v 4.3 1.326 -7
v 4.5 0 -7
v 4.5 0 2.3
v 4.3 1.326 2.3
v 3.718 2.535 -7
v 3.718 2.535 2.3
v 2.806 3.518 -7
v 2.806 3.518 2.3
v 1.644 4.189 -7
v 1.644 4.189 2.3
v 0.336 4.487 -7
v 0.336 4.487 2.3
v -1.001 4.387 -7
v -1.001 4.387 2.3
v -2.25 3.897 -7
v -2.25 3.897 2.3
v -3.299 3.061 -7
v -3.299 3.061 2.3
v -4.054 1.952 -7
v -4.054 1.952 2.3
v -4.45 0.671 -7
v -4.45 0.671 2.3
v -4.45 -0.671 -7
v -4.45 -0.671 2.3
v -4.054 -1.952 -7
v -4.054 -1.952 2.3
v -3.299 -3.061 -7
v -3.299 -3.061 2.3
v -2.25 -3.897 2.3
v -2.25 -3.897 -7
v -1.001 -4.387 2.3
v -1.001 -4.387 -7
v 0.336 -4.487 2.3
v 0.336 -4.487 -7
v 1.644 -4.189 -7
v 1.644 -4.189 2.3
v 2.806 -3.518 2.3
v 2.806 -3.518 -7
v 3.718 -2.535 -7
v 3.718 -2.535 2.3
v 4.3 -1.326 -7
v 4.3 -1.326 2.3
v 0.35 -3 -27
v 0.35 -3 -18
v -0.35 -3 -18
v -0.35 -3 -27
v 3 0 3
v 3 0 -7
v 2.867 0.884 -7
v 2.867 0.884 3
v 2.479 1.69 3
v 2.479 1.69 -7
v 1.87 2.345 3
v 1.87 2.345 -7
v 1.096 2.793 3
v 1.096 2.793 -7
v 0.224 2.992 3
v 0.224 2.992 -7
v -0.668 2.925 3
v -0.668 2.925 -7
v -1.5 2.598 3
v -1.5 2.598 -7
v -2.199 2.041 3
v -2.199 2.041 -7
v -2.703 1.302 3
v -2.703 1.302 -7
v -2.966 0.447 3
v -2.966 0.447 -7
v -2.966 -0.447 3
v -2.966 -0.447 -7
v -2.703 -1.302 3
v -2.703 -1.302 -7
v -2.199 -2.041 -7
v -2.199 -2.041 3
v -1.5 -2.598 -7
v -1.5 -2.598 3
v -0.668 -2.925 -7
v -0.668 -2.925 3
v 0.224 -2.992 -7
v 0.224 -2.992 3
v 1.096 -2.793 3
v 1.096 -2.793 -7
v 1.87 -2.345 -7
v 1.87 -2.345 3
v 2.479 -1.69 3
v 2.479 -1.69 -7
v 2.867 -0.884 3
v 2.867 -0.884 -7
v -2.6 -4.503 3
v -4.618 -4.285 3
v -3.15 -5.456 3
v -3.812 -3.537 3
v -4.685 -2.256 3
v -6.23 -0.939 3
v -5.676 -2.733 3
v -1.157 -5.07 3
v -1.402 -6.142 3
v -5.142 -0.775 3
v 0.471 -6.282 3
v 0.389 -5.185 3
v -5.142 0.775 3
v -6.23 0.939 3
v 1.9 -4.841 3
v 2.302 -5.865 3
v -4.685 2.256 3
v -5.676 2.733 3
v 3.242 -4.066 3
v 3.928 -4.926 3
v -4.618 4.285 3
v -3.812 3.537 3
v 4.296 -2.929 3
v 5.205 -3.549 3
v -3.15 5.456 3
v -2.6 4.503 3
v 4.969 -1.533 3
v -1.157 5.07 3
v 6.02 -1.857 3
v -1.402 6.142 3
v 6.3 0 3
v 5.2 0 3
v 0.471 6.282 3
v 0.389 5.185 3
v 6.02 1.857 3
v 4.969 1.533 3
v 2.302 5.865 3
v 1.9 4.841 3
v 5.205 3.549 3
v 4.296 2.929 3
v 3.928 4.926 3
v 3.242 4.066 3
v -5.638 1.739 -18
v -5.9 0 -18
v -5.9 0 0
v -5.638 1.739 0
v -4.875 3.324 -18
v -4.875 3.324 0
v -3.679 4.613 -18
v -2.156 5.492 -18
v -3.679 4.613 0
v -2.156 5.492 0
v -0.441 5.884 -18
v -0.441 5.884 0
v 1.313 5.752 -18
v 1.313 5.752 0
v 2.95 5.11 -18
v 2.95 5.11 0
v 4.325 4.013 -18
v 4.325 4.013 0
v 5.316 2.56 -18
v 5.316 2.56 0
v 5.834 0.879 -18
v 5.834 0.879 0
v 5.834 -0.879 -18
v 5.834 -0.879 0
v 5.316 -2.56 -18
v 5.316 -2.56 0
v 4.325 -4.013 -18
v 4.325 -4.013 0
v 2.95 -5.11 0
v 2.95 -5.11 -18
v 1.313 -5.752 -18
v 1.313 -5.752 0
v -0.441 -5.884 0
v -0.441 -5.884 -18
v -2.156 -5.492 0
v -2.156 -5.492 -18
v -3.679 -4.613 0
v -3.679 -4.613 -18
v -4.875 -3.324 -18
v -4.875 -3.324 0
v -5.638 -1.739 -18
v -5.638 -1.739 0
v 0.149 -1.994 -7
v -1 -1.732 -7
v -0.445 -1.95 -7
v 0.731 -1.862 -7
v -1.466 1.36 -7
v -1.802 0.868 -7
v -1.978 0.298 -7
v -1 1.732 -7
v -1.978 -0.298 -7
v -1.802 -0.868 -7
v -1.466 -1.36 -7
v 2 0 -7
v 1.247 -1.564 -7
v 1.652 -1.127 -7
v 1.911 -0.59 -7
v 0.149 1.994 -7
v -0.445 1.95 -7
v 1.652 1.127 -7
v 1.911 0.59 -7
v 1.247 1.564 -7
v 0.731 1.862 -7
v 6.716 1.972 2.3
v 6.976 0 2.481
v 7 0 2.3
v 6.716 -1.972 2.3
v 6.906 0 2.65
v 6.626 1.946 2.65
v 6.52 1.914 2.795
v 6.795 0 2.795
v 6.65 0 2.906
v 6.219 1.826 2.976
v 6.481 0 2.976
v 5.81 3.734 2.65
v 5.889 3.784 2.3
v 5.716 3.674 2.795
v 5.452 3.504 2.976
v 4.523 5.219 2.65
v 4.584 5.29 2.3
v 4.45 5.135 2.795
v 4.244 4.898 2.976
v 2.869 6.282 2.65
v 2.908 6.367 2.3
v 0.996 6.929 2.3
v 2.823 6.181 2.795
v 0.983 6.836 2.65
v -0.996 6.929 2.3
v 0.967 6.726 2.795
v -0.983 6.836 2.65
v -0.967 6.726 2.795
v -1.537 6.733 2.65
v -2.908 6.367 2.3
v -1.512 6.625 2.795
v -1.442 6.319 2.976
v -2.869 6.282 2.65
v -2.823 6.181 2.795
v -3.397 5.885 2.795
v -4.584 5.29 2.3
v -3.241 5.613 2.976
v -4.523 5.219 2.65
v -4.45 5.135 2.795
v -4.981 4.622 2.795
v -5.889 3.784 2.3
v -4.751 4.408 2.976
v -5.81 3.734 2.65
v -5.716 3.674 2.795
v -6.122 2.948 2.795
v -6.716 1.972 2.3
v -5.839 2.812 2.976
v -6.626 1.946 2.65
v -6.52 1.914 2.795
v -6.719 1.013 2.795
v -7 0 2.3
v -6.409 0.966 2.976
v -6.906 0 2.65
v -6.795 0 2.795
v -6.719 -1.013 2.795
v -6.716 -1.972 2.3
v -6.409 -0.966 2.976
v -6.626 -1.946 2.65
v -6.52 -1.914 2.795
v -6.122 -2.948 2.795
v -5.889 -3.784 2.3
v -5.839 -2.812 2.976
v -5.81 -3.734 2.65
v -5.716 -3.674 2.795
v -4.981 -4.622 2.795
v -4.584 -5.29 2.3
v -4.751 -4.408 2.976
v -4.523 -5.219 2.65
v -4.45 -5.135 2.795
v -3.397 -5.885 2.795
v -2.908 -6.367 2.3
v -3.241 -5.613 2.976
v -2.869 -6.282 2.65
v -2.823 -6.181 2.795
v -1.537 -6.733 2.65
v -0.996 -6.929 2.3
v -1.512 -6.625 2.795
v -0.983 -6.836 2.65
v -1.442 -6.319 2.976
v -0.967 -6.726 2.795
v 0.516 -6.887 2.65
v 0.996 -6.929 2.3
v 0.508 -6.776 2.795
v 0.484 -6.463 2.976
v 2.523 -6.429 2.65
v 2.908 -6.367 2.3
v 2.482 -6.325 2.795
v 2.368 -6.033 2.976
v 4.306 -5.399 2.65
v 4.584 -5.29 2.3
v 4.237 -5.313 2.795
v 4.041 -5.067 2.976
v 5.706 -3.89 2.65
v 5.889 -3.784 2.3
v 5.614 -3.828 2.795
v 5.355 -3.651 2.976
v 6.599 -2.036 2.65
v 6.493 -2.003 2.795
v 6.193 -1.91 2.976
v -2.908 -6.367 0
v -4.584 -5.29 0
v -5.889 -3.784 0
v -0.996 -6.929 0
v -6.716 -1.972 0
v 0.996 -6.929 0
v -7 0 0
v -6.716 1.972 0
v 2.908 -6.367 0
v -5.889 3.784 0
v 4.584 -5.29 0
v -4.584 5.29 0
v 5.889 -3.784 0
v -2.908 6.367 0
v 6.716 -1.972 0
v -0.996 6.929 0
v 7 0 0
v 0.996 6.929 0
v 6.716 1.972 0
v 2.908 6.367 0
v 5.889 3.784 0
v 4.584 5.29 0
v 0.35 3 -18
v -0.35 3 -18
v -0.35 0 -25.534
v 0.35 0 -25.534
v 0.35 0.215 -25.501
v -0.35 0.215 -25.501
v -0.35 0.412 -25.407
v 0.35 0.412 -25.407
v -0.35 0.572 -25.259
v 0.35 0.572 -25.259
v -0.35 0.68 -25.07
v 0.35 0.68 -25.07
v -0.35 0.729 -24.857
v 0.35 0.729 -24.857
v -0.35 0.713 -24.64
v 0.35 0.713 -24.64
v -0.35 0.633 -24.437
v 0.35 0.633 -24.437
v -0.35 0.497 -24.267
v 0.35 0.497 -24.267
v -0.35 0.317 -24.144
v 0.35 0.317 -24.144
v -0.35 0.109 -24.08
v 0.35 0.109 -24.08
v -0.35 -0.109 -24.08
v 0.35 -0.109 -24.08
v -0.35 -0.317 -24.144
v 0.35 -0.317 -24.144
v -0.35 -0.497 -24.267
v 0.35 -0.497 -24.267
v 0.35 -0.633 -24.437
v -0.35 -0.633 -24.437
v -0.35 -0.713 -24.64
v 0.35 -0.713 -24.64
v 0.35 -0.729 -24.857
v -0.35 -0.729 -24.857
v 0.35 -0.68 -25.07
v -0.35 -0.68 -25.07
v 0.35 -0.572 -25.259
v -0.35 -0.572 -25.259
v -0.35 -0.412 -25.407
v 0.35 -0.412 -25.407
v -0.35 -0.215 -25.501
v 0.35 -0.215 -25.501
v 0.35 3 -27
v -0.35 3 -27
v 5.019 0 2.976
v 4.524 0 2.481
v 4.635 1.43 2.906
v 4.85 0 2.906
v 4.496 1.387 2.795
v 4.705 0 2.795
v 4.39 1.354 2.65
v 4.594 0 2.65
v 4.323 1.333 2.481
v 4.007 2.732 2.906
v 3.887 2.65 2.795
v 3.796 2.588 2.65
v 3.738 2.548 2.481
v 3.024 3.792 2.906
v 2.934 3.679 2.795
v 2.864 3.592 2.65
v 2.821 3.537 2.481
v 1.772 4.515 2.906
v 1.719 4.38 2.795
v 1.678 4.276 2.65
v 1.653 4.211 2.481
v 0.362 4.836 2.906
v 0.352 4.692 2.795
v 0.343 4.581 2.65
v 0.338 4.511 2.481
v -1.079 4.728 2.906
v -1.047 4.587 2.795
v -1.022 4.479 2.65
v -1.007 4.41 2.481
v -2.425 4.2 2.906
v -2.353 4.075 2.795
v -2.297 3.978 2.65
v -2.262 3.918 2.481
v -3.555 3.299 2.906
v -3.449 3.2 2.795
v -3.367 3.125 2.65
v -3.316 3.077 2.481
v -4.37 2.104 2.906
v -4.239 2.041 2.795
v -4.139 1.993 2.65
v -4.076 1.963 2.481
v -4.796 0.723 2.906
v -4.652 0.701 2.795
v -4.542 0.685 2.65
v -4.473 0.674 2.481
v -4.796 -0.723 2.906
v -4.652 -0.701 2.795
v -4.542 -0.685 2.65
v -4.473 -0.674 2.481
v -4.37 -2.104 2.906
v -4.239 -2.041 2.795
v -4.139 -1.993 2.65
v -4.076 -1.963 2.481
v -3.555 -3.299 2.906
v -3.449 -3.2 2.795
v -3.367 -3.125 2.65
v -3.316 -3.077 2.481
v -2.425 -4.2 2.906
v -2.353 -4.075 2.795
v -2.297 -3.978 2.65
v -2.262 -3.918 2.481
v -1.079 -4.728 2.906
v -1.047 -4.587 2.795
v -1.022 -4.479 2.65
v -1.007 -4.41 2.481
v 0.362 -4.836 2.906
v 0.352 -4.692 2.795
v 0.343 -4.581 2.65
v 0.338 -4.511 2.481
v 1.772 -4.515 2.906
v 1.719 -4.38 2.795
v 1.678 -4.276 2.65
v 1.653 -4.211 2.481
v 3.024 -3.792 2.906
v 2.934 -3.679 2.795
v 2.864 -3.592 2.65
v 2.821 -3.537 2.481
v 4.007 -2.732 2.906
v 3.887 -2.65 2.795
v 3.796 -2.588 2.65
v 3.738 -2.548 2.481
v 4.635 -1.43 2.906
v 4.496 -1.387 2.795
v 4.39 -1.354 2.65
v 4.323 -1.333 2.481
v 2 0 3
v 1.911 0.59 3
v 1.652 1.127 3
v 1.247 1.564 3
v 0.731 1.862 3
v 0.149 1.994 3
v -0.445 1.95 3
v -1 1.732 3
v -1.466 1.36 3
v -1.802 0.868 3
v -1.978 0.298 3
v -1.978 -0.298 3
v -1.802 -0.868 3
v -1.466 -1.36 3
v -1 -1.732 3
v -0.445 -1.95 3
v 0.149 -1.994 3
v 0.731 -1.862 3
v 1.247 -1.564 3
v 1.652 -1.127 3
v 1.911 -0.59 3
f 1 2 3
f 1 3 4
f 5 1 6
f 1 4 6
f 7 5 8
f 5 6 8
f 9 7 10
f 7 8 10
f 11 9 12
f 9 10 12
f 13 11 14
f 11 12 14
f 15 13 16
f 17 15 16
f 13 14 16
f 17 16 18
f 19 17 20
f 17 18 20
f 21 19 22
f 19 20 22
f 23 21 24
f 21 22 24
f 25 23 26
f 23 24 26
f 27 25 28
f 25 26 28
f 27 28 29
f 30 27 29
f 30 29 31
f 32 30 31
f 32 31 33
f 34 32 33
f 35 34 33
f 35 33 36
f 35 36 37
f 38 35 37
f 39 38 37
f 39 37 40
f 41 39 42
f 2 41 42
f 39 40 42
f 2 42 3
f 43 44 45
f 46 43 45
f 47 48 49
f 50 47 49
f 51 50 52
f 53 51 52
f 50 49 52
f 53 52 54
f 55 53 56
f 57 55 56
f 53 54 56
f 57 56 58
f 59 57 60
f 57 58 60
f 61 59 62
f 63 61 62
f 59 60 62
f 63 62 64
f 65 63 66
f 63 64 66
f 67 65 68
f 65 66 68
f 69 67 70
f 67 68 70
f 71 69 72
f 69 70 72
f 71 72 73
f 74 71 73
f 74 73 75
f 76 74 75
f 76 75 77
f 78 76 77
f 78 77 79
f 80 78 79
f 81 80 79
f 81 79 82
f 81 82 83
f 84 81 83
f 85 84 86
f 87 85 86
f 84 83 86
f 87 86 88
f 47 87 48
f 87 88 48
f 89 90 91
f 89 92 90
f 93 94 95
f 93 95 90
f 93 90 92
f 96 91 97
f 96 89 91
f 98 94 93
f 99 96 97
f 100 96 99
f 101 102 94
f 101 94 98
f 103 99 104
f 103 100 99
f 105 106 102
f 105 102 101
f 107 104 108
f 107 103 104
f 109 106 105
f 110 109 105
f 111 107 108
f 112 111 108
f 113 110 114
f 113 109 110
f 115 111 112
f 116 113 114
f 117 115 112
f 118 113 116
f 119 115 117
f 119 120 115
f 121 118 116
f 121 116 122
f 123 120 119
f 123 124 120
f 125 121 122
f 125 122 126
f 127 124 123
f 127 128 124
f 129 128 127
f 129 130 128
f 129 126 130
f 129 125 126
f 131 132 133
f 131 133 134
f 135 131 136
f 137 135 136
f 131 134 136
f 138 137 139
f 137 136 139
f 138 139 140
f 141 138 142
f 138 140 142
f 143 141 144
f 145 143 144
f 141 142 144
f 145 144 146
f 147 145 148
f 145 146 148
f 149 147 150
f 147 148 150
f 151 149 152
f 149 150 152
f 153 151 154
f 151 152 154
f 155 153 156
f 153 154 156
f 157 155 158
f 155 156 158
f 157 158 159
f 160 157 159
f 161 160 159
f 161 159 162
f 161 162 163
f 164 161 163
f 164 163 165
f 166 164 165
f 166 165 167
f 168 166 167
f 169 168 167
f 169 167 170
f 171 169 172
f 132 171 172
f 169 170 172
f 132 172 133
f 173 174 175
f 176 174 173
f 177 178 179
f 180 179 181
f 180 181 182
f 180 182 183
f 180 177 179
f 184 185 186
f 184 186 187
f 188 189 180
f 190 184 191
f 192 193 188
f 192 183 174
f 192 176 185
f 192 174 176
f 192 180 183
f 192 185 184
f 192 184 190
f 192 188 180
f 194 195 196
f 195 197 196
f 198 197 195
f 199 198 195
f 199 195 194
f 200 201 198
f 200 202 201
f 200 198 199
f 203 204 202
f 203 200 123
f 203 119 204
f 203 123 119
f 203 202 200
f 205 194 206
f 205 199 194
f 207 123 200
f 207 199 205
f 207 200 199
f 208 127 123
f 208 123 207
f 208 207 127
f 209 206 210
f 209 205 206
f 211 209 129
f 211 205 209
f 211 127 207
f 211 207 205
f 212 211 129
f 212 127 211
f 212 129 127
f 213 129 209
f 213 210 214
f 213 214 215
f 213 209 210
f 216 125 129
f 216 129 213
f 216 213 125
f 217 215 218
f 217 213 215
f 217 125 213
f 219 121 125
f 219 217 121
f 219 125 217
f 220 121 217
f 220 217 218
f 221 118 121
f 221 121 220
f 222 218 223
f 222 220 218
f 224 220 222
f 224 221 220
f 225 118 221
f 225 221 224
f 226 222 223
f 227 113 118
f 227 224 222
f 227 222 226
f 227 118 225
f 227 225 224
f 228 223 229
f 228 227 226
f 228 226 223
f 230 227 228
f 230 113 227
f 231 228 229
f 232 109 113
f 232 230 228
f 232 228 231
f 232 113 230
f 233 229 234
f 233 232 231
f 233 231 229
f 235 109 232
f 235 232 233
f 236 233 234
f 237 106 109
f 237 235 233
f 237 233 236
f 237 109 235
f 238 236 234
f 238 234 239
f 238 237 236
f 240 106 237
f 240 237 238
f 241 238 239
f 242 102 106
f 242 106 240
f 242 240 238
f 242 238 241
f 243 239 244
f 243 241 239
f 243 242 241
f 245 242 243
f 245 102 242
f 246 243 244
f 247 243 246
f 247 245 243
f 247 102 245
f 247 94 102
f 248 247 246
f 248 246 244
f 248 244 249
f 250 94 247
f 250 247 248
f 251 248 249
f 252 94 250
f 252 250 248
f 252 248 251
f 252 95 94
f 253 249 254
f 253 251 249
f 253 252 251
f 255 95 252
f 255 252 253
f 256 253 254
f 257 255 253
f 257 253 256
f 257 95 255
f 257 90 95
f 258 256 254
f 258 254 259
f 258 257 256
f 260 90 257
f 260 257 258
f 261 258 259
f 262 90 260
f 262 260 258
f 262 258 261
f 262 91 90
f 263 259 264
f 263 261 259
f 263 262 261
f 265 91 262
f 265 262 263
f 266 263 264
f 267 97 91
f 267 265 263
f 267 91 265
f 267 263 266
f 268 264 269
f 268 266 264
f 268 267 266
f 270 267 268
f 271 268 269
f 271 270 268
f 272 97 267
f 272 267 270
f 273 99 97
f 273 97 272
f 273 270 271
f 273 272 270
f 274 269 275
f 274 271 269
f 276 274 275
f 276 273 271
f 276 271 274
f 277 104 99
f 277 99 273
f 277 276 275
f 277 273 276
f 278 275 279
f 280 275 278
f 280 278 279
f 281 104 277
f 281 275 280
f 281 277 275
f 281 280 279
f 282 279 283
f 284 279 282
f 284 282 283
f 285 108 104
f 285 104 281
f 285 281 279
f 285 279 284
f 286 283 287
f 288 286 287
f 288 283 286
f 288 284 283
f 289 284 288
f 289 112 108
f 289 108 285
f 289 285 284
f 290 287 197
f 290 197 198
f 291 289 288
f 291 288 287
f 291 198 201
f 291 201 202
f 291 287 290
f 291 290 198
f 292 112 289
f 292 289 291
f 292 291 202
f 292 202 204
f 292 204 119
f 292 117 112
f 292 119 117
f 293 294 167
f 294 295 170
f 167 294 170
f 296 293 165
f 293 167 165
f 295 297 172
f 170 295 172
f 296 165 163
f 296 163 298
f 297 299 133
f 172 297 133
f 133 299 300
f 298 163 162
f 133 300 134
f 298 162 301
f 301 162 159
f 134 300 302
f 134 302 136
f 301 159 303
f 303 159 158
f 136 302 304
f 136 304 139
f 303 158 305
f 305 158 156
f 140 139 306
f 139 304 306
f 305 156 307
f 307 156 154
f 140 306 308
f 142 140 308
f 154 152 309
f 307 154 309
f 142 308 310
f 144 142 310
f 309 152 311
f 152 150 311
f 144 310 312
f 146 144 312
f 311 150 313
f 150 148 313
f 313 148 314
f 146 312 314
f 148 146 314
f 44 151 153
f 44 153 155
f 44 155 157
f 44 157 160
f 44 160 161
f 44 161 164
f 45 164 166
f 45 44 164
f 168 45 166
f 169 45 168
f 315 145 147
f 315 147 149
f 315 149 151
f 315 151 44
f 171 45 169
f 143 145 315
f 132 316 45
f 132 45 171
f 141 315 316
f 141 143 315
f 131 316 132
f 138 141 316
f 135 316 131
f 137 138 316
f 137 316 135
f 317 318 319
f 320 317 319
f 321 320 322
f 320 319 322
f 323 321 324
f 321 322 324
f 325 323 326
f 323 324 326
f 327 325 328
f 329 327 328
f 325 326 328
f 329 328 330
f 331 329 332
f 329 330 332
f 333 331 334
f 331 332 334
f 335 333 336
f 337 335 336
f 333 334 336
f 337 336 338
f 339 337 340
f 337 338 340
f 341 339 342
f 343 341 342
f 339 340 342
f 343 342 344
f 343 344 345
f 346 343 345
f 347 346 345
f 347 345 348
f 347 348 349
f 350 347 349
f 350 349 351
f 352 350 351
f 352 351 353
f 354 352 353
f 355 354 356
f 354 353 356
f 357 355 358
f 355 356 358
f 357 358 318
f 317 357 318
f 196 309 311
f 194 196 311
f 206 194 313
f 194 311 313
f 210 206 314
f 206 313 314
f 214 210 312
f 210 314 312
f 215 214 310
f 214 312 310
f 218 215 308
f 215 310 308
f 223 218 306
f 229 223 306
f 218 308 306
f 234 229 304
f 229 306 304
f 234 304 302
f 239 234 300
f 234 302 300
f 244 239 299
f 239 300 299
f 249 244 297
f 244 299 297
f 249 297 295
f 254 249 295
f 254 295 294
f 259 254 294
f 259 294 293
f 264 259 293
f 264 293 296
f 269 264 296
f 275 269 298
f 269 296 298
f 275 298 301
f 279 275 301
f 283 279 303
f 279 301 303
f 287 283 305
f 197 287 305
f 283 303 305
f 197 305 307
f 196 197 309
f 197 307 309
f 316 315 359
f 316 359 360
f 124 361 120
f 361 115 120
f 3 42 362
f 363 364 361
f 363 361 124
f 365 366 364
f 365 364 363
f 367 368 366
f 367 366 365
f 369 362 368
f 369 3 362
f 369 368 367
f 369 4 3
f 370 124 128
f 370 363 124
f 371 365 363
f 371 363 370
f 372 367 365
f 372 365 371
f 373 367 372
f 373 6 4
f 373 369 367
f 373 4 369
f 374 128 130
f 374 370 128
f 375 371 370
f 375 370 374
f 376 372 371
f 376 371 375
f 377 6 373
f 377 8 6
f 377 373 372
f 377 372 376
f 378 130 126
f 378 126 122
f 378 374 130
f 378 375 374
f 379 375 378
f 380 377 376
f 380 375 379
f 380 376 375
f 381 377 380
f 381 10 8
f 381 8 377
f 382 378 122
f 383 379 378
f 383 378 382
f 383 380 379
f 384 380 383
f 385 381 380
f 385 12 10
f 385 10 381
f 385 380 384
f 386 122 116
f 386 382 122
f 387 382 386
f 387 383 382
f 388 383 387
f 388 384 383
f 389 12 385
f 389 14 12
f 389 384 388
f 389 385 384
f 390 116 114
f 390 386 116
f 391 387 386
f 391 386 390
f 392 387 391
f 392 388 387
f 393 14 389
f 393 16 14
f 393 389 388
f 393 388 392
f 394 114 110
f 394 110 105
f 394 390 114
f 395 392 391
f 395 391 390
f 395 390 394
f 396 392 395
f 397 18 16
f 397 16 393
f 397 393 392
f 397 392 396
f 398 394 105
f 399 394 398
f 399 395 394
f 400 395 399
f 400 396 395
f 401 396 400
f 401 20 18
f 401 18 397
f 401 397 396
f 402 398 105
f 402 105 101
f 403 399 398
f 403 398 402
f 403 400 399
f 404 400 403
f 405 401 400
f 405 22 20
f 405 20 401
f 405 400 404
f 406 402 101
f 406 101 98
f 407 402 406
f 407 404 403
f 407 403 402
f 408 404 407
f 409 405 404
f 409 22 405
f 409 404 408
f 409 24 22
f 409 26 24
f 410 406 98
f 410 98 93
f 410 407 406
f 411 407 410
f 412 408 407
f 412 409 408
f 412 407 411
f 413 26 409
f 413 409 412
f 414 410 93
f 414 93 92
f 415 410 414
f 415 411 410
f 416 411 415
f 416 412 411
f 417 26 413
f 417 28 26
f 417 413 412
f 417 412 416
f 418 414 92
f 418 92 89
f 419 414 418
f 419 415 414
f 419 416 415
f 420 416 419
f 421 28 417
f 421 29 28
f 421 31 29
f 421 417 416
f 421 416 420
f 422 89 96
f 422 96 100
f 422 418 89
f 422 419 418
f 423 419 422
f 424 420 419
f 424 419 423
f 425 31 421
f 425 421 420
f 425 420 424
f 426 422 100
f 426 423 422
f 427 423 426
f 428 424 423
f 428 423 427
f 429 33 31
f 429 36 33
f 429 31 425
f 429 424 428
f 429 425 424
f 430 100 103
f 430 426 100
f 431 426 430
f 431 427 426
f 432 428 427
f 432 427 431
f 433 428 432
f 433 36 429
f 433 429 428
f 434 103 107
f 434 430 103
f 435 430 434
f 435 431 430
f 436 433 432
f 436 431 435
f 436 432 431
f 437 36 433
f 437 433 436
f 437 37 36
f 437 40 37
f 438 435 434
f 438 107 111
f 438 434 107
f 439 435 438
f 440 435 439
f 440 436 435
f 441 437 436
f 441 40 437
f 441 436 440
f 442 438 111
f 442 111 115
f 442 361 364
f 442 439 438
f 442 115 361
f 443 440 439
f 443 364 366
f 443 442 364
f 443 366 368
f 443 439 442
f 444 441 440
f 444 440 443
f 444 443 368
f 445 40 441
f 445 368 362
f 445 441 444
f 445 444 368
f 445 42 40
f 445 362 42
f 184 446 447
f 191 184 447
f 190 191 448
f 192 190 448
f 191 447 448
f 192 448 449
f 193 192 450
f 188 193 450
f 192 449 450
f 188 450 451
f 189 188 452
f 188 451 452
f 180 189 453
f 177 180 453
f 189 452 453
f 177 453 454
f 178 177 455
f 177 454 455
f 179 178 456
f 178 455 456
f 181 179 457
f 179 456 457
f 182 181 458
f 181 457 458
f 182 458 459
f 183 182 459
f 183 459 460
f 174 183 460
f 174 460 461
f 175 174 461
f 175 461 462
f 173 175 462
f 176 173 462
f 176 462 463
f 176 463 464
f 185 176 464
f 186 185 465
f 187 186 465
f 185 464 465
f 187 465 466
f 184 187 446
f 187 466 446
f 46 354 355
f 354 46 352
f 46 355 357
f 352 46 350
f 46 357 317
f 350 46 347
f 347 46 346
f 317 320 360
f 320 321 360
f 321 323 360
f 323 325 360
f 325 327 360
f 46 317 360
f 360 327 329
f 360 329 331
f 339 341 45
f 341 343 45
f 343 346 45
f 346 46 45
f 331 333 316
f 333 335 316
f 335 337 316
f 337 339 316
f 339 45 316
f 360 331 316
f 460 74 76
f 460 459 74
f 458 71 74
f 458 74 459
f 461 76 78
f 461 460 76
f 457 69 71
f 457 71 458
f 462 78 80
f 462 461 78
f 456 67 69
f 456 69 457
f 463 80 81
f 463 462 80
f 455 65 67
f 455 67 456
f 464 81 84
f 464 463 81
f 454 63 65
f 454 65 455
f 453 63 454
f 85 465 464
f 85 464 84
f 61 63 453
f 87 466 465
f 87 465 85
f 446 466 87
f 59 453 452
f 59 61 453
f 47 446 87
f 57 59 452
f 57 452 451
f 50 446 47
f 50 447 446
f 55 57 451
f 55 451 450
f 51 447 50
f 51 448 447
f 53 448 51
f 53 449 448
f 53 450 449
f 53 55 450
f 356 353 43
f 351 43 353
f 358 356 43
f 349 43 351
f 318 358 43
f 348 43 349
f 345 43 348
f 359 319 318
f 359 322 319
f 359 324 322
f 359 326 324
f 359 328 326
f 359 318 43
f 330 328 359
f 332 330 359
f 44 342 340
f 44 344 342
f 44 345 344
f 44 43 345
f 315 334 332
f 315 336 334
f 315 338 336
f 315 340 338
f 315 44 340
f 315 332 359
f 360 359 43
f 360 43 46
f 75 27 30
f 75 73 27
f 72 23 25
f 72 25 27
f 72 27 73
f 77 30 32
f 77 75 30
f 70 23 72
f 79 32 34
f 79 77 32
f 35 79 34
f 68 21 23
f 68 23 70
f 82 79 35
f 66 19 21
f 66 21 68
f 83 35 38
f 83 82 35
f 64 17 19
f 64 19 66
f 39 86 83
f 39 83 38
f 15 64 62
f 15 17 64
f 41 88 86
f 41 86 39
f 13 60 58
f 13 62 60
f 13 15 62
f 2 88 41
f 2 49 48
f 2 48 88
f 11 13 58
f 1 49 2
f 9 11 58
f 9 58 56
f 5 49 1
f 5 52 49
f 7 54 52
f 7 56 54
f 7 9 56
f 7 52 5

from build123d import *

# Parameters (mm, degrees)
SKETCH1_R           = 7
BOSS_EXTRUDE1_DEPTH = 3
SKETCH2_R           = 5.9
BOSS_EXTRUDE2_DEPTH = 18
SKETCH3_W           = 0.7
SKETCH3_H           = 6
BOSS_EXTRUDE3_DEPTH = 9
SKETCH4_R           = 0.730989372
CUT_EXTRUDE1_DEPTH  = 0.7
SKETCH8_R           = 4.5
CUT_EXTRUDE2_DEPTH  = 10
SKETCH9_R           = 3
BOSS_EXTRUDE4_DEPTH = 10
SKETCH10_R          = 2
CUT_EXTRUDE3_DEPTH  = 10
FILLET3_R           = 0.7


with BuildPart() as part:
    # Sketch1 → Boss-Extrude1 (new body)
    with BuildSketch(Plane.XY):
        Circle(SKETCH1_R)
    extrude(amount=BOSS_EXTRUDE1_DEPTH)

    # Sketch2 → Boss-Extrude2 (add)
    with BuildSketch(Plane(origin=(0, 0, 0), x_dir=(-1, 0, 0), z_dir=(0, 0, -1))):
        Circle(SKETCH2_R)
    extrude(amount=BOSS_EXTRUDE2_DEPTH)

    # Sketch3 → Boss-Extrude3 (add)
    with BuildSketch(Plane(origin=(0, 0, -18), x_dir=(-1, 0, 0), z_dir=(0, 0, -1))):
        Rectangle(SKETCH3_W, SKETCH3_H)
    extrude(amount=BOSS_EXTRUDE3_DEPTH)

    # Sketch4 → Cut-Extrude1 (cut)
    with BuildSketch(Plane(origin=(0.35, 0, 0), x_dir=(0, 0, -1), z_dir=(1, 0, 0))):
        with Locations((24.802762054, 0)):
            Circle(SKETCH4_R)
    extrude(amount=-CUT_EXTRUDE1_DEPTH, mode=Mode.SUBTRACT)

    # Sketch8 → Cut-Extrude2 (cut)
    with BuildSketch(Plane.XY.offset(3)):
        Circle(SKETCH8_R)
    extrude(amount=-CUT_EXTRUDE2_DEPTH, mode=Mode.SUBTRACT)

    # Sketch9 → Boss-Extrude4 (add)
    with BuildSketch(Plane.XY.offset(-7)):
        Circle(SKETCH9_R)
    extrude(amount=BOSS_EXTRUDE4_DEPTH)

    # Sketch10 → Cut-Extrude3 (cut)
    with BuildSketch(Plane.XY.offset(3)):
        Circle(SKETCH10_R)
    extrude(amount=-CUT_EXTRUDE3_DEPTH, mode=Mode.SUBTRACT)

    # Fillet3
    fillet3_edges = [part.edges().sort_by_distance(p)[0] for p in [
        (-4.5, 0, 3),
        (-7, 0, 3),
    ]]
    fillet(fillet3_edges, radius=FILLET3_R)


solid = part.part
